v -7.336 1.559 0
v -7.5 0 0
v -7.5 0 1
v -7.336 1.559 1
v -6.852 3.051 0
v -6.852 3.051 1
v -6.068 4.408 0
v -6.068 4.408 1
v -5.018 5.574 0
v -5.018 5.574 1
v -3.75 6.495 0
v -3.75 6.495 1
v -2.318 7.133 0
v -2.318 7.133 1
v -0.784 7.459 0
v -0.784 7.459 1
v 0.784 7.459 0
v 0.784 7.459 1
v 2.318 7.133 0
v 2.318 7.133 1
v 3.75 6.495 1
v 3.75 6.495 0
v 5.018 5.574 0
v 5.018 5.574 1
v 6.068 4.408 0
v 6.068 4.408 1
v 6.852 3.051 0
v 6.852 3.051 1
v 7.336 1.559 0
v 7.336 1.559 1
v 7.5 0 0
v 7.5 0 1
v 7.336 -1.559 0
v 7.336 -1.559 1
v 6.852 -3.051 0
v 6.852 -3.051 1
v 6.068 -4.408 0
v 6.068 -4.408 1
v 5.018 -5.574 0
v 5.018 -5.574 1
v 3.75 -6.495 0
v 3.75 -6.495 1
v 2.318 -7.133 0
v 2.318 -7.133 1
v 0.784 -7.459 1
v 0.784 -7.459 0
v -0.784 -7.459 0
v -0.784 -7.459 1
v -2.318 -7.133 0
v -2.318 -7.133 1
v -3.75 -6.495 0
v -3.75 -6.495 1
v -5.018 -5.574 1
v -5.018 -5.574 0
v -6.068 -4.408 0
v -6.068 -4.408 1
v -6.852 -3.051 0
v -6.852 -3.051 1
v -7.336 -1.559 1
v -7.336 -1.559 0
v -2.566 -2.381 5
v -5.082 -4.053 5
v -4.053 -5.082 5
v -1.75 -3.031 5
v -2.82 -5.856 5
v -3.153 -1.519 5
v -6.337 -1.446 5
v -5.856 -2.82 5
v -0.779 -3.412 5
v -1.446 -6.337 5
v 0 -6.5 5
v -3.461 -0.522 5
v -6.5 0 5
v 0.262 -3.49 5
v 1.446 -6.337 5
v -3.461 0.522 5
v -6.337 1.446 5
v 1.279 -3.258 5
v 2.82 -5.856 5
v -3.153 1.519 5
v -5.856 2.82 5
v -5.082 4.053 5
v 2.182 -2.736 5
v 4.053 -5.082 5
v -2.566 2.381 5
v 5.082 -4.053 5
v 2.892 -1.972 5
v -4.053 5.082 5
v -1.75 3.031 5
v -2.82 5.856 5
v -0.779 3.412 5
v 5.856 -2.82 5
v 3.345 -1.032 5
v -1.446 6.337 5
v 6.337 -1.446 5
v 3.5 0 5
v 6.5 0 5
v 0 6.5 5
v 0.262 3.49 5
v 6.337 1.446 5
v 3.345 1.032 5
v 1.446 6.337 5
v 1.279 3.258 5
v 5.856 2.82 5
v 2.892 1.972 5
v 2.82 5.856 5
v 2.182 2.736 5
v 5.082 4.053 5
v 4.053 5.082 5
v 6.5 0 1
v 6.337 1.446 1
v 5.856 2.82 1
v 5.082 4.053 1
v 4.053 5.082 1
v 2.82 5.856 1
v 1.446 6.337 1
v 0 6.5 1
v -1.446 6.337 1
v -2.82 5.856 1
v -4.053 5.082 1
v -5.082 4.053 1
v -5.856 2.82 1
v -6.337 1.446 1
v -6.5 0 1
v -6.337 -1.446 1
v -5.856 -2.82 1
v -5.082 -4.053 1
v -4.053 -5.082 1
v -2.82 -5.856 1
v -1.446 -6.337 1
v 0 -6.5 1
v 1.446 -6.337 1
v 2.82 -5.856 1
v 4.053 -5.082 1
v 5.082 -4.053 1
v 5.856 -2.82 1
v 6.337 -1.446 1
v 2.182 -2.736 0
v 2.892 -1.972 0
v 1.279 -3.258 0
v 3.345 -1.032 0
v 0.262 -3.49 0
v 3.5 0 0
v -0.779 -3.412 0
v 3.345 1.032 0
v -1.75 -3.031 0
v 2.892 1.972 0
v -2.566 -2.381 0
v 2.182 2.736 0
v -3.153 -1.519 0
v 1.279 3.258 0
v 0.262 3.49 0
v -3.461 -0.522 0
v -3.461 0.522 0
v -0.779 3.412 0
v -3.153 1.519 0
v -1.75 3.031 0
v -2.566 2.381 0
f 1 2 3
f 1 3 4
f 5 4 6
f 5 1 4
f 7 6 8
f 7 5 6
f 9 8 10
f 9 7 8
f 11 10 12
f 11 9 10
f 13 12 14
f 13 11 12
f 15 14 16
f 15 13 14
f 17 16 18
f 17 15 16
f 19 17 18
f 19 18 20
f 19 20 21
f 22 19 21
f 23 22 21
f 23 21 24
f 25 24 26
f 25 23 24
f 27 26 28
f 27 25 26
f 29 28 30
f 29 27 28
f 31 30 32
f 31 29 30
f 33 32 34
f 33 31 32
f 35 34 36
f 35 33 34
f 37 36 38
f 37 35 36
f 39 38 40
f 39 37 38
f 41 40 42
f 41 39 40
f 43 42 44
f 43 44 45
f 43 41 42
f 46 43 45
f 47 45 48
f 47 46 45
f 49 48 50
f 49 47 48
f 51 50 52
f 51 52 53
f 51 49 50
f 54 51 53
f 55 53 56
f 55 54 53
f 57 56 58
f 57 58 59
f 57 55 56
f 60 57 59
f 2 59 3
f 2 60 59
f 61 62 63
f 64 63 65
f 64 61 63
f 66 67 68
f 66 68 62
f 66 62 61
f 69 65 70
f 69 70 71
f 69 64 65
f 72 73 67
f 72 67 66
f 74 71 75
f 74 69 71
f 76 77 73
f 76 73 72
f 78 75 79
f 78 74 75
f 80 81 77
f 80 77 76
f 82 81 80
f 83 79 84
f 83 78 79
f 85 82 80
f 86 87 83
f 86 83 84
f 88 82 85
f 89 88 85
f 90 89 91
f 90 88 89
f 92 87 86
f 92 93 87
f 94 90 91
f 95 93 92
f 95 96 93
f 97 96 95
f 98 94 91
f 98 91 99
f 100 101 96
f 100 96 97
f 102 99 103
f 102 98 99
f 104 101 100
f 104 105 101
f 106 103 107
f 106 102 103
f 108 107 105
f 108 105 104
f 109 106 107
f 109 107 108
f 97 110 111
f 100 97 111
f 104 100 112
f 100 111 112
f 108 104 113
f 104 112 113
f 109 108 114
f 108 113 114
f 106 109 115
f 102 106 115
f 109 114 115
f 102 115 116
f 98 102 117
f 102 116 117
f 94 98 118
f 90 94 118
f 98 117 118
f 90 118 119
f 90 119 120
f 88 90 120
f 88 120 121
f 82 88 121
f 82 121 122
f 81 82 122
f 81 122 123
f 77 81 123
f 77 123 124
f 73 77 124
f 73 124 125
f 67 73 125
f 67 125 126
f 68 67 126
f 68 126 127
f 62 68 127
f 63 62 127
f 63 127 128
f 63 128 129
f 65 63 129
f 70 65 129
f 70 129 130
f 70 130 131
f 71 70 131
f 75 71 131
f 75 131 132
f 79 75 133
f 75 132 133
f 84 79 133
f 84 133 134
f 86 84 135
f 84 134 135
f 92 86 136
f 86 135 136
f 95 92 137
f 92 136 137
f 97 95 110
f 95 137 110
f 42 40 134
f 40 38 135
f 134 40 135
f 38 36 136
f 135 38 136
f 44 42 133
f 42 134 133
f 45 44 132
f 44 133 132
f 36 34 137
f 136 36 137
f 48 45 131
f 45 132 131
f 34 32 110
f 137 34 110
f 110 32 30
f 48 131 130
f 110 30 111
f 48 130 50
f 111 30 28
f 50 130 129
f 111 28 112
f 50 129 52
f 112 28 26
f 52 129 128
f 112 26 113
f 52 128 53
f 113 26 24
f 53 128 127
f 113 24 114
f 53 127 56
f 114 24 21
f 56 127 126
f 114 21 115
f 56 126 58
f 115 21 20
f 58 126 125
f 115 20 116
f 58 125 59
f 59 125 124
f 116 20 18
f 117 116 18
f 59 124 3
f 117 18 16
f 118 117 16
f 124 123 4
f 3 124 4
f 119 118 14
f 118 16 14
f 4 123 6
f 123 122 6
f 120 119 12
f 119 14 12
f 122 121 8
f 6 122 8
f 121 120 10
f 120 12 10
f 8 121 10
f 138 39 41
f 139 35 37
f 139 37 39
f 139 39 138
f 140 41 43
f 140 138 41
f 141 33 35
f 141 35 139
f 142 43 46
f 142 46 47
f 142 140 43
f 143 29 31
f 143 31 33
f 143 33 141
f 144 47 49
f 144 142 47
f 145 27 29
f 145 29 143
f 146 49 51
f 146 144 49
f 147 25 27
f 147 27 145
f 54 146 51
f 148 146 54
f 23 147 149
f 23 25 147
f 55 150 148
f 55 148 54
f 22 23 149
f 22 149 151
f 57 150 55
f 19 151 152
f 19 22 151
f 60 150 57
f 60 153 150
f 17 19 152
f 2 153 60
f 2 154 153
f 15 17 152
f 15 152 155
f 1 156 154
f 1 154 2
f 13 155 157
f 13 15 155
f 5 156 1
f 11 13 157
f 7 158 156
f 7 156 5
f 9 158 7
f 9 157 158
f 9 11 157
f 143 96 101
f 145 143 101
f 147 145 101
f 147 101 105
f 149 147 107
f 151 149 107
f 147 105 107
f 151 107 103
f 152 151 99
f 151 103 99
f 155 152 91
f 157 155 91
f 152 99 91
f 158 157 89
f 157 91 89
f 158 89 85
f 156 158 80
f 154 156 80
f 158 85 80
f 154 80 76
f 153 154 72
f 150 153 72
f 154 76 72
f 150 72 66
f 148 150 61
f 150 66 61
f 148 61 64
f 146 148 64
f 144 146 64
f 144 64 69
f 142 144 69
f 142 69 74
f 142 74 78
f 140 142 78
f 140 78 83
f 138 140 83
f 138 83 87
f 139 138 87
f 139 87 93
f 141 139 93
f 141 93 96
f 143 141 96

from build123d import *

# Parameters (mm, degrees)
SKETCH_1_R          = 6.5
EXTRUDE_1_DEPTH     = 5
SKETCH_2_R          = 7.5
EXTRUDE_2_DEPTH     = 1
SKETCH_3_R          = 3.5
CUT_EXTRUDE_1_DEPTH = 12.7260394


with BuildPart() as part:
    # ｽｹｯﾁ1 → ﾎﾞｽ - 押し出し1 (new body)
    with BuildSketch(Plane.XY):
        Circle(SKETCH_1_R)
    extrude(amount=EXTRUDE_1_DEPTH)

    # ｽｹｯﾁ2 → ﾎﾞｽ - 押し出し2 (add)
    with BuildSketch(Plane(origin=(0, 0, 0), x_dir=(-1, 0, 0), z_dir=(0, 0, -1))):
        Circle(SKETCH_2_R)
    extrude(amount=-EXTRUDE_2_DEPTH)

    # ｽｹｯﾁ3 → ｶｯﾄ - 押し出し1 (cut, through all)
    with BuildSketch(Plane.XY.offset(5)):
        Circle(SKETCH_3_R)
    extrude(amount=-CUT_EXTRUDE_1_DEPTH, mode=Mode.SUBTRACT)


solid = part.part
